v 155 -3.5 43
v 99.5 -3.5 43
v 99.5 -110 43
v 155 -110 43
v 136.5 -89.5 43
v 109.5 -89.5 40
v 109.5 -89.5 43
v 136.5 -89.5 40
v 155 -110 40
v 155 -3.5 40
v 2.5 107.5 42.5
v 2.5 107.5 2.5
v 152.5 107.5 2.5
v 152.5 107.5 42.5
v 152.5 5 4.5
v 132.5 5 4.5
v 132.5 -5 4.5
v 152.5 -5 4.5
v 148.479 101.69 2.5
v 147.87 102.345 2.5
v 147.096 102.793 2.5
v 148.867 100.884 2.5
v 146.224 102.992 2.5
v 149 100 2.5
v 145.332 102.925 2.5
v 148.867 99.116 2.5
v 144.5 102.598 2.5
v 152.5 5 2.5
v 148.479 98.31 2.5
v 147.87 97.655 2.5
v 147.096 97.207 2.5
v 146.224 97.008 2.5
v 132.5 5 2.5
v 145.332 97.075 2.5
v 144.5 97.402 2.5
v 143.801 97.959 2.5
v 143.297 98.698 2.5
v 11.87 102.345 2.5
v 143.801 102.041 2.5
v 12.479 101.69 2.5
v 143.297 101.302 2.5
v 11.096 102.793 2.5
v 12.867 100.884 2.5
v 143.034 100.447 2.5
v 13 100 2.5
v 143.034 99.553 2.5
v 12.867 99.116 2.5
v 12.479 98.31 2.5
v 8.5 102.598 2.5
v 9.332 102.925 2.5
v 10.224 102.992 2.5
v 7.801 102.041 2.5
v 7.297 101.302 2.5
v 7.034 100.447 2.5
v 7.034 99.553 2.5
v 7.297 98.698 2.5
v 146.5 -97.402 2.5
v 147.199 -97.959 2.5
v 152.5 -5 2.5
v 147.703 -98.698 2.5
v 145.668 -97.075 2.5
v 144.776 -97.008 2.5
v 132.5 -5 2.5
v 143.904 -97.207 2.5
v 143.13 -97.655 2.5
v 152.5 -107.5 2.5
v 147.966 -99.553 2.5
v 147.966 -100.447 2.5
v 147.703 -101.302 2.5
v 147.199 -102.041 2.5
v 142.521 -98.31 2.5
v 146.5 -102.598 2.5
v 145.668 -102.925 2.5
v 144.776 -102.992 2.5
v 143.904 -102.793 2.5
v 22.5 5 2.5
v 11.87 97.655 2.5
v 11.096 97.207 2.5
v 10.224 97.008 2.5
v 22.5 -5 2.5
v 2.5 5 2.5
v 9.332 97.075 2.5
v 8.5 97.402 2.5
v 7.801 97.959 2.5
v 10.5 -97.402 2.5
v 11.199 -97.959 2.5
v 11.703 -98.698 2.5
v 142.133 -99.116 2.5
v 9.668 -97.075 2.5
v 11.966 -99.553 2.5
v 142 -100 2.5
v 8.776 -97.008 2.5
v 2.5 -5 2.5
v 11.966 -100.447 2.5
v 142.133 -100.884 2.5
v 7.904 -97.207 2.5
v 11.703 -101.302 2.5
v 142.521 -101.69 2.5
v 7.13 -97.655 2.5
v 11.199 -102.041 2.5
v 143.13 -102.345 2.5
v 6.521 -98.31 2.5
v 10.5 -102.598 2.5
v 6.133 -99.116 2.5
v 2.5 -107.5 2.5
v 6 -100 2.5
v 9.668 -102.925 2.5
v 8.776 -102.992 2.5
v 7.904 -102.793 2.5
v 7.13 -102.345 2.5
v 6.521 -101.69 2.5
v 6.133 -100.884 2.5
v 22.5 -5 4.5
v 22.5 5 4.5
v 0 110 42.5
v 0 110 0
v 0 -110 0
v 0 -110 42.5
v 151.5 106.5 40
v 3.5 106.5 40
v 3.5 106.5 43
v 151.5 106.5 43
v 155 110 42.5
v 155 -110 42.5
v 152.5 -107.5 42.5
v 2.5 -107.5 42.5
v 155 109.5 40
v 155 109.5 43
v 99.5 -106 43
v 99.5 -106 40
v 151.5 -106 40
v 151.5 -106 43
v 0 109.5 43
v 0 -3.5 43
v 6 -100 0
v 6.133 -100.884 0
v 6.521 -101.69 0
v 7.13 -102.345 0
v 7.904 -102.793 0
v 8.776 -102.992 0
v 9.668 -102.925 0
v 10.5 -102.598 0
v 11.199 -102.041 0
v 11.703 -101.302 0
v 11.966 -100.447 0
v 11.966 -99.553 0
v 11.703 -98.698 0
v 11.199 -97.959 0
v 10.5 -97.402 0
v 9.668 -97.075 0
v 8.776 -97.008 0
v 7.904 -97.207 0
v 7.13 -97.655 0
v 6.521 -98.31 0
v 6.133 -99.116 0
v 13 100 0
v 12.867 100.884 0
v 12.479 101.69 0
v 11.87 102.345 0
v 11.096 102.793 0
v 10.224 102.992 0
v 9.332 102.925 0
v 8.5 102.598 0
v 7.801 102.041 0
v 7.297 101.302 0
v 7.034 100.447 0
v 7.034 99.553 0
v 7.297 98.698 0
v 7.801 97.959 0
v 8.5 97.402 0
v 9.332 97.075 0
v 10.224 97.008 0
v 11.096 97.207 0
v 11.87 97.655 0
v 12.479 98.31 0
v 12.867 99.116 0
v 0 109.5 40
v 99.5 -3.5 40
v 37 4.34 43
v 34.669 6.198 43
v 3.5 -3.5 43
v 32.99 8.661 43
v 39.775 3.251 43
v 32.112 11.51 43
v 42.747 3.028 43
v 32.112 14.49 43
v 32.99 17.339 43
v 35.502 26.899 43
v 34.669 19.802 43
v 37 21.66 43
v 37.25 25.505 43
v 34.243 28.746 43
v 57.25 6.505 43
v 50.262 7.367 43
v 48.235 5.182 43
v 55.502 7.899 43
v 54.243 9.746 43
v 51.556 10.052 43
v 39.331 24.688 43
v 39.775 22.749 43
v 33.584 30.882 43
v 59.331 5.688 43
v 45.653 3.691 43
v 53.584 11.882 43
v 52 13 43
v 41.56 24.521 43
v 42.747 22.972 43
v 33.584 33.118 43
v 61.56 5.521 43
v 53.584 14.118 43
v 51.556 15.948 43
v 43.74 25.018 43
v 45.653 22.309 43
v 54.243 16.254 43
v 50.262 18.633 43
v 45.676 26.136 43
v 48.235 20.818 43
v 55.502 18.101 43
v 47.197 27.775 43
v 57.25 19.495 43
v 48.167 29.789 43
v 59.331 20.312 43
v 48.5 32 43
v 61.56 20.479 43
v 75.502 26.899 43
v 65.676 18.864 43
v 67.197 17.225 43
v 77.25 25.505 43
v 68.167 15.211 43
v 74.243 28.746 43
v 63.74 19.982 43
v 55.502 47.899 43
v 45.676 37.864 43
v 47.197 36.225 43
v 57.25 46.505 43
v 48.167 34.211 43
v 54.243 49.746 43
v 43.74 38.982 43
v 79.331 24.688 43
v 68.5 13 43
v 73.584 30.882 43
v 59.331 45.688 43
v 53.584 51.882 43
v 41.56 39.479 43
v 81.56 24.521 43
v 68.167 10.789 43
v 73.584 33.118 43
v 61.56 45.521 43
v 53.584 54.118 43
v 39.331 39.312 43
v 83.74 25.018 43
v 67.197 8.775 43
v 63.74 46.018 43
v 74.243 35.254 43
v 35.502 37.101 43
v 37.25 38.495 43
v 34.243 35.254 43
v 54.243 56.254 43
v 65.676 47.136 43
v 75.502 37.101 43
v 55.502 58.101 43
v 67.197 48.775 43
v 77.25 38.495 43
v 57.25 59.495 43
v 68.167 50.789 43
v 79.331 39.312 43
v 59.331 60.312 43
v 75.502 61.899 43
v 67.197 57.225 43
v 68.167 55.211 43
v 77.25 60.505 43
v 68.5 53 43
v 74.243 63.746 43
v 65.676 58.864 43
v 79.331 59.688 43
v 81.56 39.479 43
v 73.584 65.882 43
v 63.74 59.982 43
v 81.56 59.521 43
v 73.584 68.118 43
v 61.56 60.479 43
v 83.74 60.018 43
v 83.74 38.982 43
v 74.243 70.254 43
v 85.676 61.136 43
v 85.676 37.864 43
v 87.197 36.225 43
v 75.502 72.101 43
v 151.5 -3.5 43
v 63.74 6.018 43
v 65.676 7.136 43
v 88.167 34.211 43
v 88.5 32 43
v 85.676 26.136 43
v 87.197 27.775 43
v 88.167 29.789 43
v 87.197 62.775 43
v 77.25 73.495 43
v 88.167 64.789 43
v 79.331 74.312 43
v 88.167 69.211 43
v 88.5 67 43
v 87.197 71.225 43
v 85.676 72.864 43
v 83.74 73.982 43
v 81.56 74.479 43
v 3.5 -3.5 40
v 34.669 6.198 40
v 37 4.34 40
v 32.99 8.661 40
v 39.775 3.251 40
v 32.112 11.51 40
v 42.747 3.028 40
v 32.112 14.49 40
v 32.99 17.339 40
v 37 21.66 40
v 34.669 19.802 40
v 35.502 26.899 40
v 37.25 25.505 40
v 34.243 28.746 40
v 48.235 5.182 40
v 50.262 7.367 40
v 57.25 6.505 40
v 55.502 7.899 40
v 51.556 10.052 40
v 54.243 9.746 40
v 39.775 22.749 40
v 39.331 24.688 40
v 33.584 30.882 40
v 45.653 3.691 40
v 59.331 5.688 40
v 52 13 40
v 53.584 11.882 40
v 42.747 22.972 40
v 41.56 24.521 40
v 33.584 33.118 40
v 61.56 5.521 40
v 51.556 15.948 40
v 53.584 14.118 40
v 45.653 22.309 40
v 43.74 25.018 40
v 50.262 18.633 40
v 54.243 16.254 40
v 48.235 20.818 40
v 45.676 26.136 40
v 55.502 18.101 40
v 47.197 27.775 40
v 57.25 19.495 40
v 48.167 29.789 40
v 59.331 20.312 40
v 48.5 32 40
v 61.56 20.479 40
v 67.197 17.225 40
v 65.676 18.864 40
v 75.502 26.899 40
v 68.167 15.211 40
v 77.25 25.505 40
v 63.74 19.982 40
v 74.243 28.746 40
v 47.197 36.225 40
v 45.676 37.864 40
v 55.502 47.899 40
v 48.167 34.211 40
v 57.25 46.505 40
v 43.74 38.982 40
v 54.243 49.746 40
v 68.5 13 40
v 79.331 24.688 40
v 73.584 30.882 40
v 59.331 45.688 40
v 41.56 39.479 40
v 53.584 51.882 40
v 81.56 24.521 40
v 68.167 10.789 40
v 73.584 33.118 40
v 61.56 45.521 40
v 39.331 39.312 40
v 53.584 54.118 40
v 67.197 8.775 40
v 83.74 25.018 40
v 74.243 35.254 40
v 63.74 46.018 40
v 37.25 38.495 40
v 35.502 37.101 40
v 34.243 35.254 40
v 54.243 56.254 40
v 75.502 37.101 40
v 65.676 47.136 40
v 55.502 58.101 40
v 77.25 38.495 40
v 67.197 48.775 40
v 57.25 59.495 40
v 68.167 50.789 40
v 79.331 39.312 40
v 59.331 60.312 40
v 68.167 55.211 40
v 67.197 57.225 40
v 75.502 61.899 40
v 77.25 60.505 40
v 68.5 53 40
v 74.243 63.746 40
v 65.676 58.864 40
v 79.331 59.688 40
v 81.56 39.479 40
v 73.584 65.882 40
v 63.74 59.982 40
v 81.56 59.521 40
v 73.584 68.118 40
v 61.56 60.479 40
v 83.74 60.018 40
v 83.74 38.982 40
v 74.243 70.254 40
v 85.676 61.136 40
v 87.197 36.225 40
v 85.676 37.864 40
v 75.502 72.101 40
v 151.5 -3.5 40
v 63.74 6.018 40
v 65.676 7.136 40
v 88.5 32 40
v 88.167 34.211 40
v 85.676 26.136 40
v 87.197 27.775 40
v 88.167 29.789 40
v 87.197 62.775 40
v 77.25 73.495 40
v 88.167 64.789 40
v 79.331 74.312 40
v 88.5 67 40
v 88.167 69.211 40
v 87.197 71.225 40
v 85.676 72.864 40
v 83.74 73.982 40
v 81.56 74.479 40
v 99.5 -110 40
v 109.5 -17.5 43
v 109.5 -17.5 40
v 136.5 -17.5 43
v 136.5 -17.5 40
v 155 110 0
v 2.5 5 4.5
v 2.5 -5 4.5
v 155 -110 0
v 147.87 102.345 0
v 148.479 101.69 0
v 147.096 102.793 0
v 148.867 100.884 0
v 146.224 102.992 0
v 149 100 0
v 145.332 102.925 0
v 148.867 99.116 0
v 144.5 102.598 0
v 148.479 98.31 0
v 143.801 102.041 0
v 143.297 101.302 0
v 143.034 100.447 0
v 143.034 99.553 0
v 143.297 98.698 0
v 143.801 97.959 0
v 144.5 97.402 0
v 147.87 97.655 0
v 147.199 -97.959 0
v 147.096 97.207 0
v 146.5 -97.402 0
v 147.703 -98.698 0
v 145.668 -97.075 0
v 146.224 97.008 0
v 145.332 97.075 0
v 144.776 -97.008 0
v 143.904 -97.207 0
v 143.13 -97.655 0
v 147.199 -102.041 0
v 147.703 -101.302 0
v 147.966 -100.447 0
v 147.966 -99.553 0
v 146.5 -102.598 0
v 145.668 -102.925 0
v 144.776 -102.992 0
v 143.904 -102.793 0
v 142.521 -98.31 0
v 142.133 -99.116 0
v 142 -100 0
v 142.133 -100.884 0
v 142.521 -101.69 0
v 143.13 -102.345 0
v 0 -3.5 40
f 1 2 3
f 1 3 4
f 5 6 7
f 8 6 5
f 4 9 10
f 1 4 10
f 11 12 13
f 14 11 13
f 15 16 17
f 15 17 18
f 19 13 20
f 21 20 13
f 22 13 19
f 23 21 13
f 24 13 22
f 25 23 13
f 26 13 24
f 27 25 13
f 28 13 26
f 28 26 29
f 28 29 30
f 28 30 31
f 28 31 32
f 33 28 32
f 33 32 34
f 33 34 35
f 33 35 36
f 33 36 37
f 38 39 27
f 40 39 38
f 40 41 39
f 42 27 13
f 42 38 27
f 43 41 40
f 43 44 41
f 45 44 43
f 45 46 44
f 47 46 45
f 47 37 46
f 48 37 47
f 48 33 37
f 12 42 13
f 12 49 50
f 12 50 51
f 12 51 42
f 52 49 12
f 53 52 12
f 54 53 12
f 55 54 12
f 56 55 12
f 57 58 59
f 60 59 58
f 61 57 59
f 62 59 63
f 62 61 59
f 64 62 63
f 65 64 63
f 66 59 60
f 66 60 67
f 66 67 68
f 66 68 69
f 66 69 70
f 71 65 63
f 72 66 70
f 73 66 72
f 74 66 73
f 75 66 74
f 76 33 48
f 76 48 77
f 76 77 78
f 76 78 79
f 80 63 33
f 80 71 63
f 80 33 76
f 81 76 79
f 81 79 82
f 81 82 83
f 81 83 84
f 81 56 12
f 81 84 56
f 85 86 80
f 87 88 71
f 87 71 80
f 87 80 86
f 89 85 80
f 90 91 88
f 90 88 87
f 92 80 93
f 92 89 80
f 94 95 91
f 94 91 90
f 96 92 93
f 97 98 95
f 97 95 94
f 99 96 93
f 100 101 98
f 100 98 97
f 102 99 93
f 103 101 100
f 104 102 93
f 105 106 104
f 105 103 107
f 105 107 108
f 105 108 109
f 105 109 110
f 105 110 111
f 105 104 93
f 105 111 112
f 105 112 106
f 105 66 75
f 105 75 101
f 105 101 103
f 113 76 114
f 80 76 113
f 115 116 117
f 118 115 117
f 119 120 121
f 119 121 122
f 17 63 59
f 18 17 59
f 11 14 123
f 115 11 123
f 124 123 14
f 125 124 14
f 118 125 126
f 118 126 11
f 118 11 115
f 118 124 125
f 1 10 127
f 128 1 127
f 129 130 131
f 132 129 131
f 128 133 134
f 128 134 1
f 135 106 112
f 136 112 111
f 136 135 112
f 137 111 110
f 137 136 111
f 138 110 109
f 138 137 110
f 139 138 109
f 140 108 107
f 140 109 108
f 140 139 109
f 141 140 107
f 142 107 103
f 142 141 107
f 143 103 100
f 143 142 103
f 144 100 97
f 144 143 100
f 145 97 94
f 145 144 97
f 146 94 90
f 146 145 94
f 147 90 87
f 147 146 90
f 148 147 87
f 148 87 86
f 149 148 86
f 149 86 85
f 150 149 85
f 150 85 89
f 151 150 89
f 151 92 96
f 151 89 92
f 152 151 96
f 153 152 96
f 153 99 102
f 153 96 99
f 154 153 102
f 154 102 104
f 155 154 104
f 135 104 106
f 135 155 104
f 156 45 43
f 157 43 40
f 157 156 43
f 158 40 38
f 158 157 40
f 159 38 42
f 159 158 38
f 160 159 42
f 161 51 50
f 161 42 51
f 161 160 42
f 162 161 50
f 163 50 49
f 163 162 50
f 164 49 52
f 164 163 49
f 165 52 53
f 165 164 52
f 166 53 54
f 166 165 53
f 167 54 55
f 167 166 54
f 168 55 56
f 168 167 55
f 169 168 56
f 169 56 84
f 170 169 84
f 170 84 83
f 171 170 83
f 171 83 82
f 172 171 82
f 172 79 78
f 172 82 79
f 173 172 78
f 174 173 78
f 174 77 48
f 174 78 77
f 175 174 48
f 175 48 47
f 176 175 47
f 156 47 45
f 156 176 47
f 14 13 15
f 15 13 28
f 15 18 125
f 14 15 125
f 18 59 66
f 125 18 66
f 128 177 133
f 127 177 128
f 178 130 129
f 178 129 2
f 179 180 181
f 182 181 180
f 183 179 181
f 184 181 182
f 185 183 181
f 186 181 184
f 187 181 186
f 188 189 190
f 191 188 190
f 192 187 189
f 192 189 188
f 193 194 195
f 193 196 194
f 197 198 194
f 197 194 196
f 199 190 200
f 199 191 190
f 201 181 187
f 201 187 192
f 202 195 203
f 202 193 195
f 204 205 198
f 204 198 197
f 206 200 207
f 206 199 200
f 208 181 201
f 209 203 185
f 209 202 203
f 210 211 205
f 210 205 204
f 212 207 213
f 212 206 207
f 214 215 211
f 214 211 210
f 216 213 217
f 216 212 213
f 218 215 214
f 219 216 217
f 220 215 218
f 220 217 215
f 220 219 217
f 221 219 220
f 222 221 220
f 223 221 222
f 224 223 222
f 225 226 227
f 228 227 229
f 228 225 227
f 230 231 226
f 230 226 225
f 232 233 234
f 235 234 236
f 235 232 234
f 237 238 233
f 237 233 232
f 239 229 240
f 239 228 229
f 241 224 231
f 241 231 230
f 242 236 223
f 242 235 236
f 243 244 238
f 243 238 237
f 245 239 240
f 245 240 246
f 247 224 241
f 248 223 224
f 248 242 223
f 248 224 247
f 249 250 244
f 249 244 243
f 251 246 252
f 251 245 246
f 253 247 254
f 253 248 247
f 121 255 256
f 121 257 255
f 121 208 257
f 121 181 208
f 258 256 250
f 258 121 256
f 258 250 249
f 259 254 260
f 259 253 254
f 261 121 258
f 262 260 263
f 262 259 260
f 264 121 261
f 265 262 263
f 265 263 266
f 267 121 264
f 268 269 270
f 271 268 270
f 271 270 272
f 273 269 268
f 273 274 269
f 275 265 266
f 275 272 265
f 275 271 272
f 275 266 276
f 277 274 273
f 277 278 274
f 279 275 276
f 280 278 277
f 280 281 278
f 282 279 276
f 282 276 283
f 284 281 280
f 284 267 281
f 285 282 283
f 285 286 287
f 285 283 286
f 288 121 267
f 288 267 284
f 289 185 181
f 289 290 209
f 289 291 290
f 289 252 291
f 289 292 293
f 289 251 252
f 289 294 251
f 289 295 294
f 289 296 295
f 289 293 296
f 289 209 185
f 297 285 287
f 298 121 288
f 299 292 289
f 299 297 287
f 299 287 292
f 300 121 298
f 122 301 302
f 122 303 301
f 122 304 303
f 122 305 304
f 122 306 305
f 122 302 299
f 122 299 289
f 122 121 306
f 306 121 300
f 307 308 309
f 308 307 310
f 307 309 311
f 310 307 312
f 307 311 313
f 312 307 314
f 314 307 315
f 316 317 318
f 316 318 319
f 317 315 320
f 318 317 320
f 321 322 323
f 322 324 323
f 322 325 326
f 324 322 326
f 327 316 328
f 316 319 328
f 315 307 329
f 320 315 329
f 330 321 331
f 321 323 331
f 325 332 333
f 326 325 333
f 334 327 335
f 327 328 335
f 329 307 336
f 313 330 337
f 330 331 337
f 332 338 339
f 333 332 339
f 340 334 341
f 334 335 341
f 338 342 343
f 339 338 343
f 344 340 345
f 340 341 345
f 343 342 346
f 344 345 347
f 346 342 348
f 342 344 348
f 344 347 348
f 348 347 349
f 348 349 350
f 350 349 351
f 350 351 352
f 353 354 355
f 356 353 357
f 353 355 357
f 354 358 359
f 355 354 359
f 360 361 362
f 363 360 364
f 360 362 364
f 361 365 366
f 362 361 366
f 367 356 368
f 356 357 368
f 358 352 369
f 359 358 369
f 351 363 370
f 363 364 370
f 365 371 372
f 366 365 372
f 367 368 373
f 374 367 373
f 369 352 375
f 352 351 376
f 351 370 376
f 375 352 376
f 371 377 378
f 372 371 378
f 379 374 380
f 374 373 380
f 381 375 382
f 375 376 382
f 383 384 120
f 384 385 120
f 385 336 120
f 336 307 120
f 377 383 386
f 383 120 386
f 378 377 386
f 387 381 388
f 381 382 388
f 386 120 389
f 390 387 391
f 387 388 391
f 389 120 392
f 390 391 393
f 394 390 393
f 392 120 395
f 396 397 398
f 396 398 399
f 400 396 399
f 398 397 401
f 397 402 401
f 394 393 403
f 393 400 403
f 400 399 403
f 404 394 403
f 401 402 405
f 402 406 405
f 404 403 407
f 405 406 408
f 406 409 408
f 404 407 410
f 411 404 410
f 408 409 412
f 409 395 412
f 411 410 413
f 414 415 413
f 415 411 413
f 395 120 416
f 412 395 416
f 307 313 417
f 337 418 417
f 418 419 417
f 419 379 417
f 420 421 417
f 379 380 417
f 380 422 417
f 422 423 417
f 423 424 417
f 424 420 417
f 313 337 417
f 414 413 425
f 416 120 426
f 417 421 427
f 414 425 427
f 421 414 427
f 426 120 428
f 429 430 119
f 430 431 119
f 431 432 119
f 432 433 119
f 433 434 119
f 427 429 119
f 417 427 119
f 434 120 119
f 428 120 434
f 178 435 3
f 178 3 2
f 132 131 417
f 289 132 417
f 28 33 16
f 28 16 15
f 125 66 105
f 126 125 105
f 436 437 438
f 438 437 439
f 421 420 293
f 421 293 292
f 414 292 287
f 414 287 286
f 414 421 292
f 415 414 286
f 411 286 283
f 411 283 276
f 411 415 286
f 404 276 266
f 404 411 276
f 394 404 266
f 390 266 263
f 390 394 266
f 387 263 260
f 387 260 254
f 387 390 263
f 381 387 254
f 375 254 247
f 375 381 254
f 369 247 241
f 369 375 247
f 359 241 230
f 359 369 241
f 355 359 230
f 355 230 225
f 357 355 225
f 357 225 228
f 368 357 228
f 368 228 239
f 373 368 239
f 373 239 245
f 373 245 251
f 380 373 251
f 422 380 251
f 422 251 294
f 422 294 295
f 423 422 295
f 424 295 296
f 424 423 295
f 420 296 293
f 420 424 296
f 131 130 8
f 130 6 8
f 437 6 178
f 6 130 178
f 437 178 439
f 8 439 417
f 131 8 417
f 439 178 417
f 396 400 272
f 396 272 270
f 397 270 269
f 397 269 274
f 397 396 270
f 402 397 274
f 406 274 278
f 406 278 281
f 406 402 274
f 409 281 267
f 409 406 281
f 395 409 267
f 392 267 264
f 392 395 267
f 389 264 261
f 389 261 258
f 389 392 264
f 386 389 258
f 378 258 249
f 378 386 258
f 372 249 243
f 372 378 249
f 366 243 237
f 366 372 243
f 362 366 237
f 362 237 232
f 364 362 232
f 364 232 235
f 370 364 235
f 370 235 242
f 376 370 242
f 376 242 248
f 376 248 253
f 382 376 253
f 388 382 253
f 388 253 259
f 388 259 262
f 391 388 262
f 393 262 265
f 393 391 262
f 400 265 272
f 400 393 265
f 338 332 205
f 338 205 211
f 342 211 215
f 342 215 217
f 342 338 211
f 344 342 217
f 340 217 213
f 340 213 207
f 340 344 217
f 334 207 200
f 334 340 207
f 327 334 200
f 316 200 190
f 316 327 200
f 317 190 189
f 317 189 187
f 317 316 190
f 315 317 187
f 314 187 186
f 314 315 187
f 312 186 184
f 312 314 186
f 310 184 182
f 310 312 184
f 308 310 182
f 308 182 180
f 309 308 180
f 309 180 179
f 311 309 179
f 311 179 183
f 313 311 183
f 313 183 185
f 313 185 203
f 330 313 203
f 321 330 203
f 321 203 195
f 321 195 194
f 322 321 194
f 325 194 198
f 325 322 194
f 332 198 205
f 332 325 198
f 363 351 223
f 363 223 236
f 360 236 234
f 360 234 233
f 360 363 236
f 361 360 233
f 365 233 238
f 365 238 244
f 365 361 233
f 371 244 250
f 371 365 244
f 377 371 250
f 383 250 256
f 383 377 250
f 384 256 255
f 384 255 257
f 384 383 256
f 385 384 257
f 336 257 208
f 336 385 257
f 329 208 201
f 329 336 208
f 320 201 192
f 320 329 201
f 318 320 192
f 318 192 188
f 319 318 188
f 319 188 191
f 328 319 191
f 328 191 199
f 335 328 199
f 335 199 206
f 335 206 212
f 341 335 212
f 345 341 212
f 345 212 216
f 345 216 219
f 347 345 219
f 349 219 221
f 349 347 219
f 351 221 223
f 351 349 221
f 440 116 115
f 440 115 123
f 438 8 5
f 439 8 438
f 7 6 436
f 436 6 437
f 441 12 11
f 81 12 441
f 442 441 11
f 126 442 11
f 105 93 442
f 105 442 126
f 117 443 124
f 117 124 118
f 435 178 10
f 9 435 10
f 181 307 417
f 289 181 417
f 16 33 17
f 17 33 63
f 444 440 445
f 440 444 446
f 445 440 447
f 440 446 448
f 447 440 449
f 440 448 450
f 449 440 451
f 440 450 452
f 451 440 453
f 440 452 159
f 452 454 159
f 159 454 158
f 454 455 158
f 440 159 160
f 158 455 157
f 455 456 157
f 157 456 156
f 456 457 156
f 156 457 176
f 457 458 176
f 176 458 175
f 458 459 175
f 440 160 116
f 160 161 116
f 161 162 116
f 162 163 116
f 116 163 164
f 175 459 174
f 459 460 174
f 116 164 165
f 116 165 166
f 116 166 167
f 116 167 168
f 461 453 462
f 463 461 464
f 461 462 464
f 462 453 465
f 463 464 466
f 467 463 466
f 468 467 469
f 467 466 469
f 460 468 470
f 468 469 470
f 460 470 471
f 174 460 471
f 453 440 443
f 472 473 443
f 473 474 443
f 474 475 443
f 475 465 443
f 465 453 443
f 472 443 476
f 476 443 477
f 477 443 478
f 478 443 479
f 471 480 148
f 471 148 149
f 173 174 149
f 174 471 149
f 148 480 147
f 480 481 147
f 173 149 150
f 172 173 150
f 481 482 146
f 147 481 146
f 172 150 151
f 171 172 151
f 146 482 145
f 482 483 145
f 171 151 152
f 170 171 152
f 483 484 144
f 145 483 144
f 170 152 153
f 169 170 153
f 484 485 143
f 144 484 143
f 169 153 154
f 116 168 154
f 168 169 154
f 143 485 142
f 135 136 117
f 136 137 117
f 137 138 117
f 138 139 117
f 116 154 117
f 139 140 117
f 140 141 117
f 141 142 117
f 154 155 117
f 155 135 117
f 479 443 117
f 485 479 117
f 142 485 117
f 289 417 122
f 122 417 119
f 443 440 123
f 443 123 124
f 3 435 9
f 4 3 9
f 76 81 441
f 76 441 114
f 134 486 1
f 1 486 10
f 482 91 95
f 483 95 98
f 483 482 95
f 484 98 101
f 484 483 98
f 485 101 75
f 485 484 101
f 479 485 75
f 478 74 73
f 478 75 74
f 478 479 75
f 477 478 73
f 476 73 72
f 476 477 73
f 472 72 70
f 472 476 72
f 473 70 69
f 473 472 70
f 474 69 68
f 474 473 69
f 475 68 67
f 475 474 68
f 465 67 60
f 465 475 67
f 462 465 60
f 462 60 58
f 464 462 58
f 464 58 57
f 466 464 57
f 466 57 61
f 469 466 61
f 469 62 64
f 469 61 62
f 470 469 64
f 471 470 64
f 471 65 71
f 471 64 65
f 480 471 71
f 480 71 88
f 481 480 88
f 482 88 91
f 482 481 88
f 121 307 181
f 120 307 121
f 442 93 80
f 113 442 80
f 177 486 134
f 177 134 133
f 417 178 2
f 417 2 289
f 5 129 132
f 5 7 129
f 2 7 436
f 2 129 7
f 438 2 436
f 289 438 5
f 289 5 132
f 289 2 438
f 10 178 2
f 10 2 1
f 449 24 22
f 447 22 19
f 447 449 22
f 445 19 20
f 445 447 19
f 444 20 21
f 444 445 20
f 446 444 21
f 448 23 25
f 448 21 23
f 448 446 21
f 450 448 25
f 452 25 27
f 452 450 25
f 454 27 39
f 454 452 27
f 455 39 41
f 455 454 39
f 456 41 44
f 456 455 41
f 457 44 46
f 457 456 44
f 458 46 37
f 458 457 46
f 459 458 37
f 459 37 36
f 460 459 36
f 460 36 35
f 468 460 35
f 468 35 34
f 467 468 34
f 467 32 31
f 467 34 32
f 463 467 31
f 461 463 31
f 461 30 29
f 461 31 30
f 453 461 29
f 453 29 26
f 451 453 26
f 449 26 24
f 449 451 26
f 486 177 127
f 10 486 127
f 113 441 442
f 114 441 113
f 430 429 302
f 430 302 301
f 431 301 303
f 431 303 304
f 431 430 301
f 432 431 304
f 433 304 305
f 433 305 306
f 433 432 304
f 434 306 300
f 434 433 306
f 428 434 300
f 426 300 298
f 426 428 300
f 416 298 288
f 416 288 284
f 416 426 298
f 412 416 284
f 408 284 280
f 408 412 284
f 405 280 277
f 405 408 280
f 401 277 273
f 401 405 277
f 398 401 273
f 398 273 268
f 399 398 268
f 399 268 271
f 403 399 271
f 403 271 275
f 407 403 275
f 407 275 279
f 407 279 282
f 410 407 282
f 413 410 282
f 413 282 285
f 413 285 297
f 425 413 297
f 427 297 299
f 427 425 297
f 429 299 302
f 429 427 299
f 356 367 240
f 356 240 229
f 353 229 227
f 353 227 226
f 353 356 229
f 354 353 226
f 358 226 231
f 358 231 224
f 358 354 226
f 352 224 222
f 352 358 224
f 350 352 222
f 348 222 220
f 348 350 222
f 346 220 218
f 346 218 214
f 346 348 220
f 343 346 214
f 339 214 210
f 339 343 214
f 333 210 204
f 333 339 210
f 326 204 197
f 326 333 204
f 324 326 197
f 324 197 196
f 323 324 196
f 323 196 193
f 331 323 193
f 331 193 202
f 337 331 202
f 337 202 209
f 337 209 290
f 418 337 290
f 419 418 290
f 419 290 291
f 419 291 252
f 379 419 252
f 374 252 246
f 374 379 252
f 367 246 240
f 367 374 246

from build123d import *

# Parameters (mm, degrees)
BOX_W                     = 155
BOX_H                     = 113
BOX_DEPTH                 = 3
BOX010_W                  = 55.5
BOX010_H                  = 106.5
BOX010_DEPTH              = 3
BOX015_W                  = 10
BOX015_H                  = 10
BOX015_DEPTH              = 2
CYLINDER003_R             = 3
CYLINDER003_DEPTH         = 10
CYLINDER004_R             = 3
CYLINDER004_DEPTH         = 10
BOX013_W                  = 2.5
BOX013_H                  = 110
BOX013_DEPTH              = 42.5
BOX016_W                  = 155
BOX016_H                  = 2.5
BOX016_DEPTH              = 42.5
BOX011_W                  = 155
BOX011_H                  = 110
BOX011_DEPTH              = 2.5
BOX012_W                  = 2.5
BOX012_H                  = 110
BOX012_DEPTH              = 42.5
BOX014_W                  = 10
BOX014_H                  = 10
BOX014_DEPTH              = 2
FUSION003_PLACEMENT_ANGLE = 180
CYLINDER001_R             = 3
CYLINDER001_DEPTH         = 10
CYLINDER002_R             = 3
CYLINDER002_DEPTH         = 10
BOX006_W                  = 2.5
BOX006_H                  = 110
BOX006_DEPTH              = 42.5
BOX007_W                  = 155
BOX007_H                  = 2.5
BOX007_DEPTH              = 42.5
BOX004_W                  = 155
BOX004_H                  = 110
BOX004_DEPTH              = 2.5
BOX005_W                  = 2.5
BOX005_H                  = 110
BOX005_DEPTH              = 42.5
BOX009_W                  = 10
BOX009_H                  = 10
BOX009_DEPTH              = 2
BOX008_W                  = 10
BOX008_H                  = 10
BOX008_DEPTH              = 2
BOX019_W                  = 27
BOX019_H                  = 72
BOX019_DEPTH              = 3
BOX018_W                  = 52
BOX018_H                  = 102.5
BOX018_DEPTH              = 3
CYLINDER009_R             = 10
CYLINDER009_DEPTH         = 3
CYLINDER005_R             = 7.5
CYLINDER005_DEPTH         = 3
CYLINDER006_R             = 7.5
CYLINDER006_DEPTH         = 3
CYLINDER007_R             = 7.5
CYLINDER007_DEPTH         = 3
CYLINDER008_R             = 7.5
CYLINDER008_DEPTH         = 3
CYLINDER_R                = 7.5
CYLINDER_DEPTH            = 3
BOX017_W                  = 148
BOX017_H                  = 110
BOX017_DEPTH              = 3


with BuildPart() as tampa1:
    # Box → Box (new body)
    with BuildSketch(Plane(origin=(0, -3.5, 40), x_dir=(1, 0, 0), z_dir=(0, 0, 1))):
        with Locations((77.5, 56.5)):
            Rectangle(BOX_W, BOX_H)
    extrude(amount=BOX_DEPTH)


with BuildPart() as tampa2:
    # Box010 → Box010 (new body)
    with BuildSketch(Plane(origin=(99.5, -110, 40), x_dir=(1, 0, 0), z_dir=(0, 0, 1))):
        with Locations((27.75, 53.25)):
            Rectangle(BOX010_W, BOX010_H)
    extrude(amount=BOX010_DEPTH)


with BuildPart() as suporte003:
    # Box015 → Box015 (new body)
    with BuildSketch(Plane(origin=(132.5, -5, 2.5), x_dir=(1, 0, 0), z_dir=(0, 0, 1))):
        with Locations((5, 5)):
            Rectangle(BOX015_W, BOX015_H)
    extrude(amount=BOX015_DEPTH)


with BuildPart() as cylinder003:
    # Cylinder003 → Cylinder003 (new body)
    with BuildSketch(Plane(origin=(10, 100, 0), x_dir=(1, 0, 0), z_dir=(0, 0, 1))):
        Circle(CYLINDER003_R)
    extrude(amount=CYLINDER003_DEPTH)


with BuildPart() as cylinder004:
    # Cylinder004 → Cylinder004 (new body)
    with BuildSketch(Plane(origin=(146, 100, 0), x_dir=(1, 0, 0), z_dir=(0, 0, 1))):
        Circle(CYLINDER004_R)
    extrude(amount=CYLINDER004_DEPTH)


with BuildPart() as wall_lado004:
    # Box013 → Box013 (new body)
    with BuildSketch(Plane(origin=(152.5, 0, 0), x_dir=(1, 0, 0), z_dir=(0, 0, 1))):
        with Locations((1.25, 55)):
            Rectangle(BOX013_W, BOX013_H)
    extrude(amount=BOX013_DEPTH)


with BuildPart() as wall_tras001:
    # Box016 → Box016 (new body)
    with BuildSketch(Plane(origin=(0, 107.5, 0), x_dir=(1, 0, 0), z_dir=(0, 0, 1))):
        with Locations((77.5, 1.25)):
            Rectangle(BOX016_W, BOX016_H)
    extrude(amount=BOX016_DEPTH)


with BuildPart() as base001:
    # Box011 → Box011 (new body)
    with BuildSketch(Plane.XY):
        with Locations((77.5, 55)):
            Rectangle(BOX011_W, BOX011_H)
    extrude(amount=BOX011_DEPTH)


with BuildPart() as cut003:
    # Box012 → Box012 (new body)
    with BuildSketch(Plane.XY):
        with Locations((1.25, 55)):
            Rectangle(BOX012_W, BOX012_H)
    extrude(amount=BOX012_DEPTH)

    # Fusion004: union wall_lado004, wall_tras001, base001
    add(wall_lado004.part)
    add(wall_tras001.part)
    add(base001.part)

    # Cut002: cut Cylinder004
    add(cylinder004.part, mode=Mode.SUBTRACT)

    # Cut003: cut Cylinder003
    add(cylinder003.part, mode=Mode.SUBTRACT)


with BuildPart() as partedois:
    # Box014 → Box014 (new body)
    with BuildSketch(Plane(origin=(12.5, -5, 2.5), x_dir=(1, 0, 0), z_dir=(0, 0, 1))):
        with Locations((5, 5)):
            Rectangle(BOX014_W, BOX014_H)
    extrude(amount=BOX014_DEPTH)

    # Fusion003: union suporte003, Cut003
    add(suporte003.part)
    add(cut003.part)


with BuildPart() as partedois_1:
    # Fusion003 placement: moved
    add(partedois.part.moved(Location((155, 0, 0))).rotate(Axis((155, 0, 0), (0, 0, 1)), FUSION003_PLACEMENT_ANGLE))


with BuildPart() as cylinder001:
    # Cylinder001 → Cylinder001 (new body)
    with BuildSketch(Plane(origin=(10, 100, 0), x_dir=(1, 0, 0), z_dir=(0, 0, 1))):
        Circle(CYLINDER001_R)
    extrude(amount=CYLINDER001_DEPTH)


with BuildPart() as cylinder002:
    # Cylinder002 → Cylinder002 (new body)
    with BuildSketch(Plane(origin=(146, 100, 0), x_dir=(1, 0, 0), z_dir=(0, 0, 1))):
        Circle(CYLINDER002_R)
    extrude(amount=CYLINDER002_DEPTH)


with BuildPart() as wall_lado2:
    # Box006 → Box006 (new body)
    with BuildSketch(Plane(origin=(152.5, 0, 0), x_dir=(1, 0, 0), z_dir=(0, 0, 1))):
        with Locations((1.25, 55)):
            Rectangle(BOX006_W, BOX006_H)
    extrude(amount=BOX006_DEPTH)


with BuildPart() as wall_tras:
    # Box007 → Box007 (new body)
    with BuildSketch(Plane(origin=(0, 107.5, 0), x_dir=(1, 0, 0), z_dir=(0, 0, 1))):
        with Locations((77.5, 1.25)):
            Rectangle(BOX007_W, BOX007_H)
    extrude(amount=BOX007_DEPTH)


with BuildPart() as base:
    # Box004 → Box004 (new body)
    with BuildSketch(Plane.XY):
        with Locations((77.5, 55)):
            Rectangle(BOX004_W, BOX004_H)
    extrude(amount=BOX004_DEPTH)


with BuildPart() as cut001:
    # Box005 → Box005 (new body)
    with BuildSketch(Plane.XY):
        with Locations((1.25, 55)):
            Rectangle(BOX005_W, BOX005_H)
    extrude(amount=BOX005_DEPTH)

    # Fusion001: union wall_lado2, wall_tras, base
    add(wall_lado2.part)
    add(wall_tras.part)
    add(base.part)

    # Cut: cut Cylinder002
    add(cylinder002.part, mode=Mode.SUBTRACT)

    # Cut001: cut Cylinder001
    add(cylinder001.part, mode=Mode.SUBTRACT)


with BuildPart() as fusion:
    # Box009 → Box009 (new body)
    with BuildSketch(Plane(origin=(142.5, -5, 2.5), x_dir=(1, 0, 0), z_dir=(0, 0, 1))):
        with Locations((5, 5)):
            Rectangle(BOX009_W, BOX009_H)
    extrude(amount=BOX009_DEPTH)

    # Fusion: union Cut001
    add(cut001.part)


with BuildPart() as caixa:
    # Box008 → Box008 (new body)
    with BuildSketch(Plane(origin=(2.5, -5, 2.5), x_dir=(1, 0, 0), z_dir=(0, 0, 1))):
        with Locations((5, 5)):
            Rectangle(BOX008_W, BOX008_H)
    extrude(amount=BOX008_DEPTH)

    # Fusion002: union Fusion
    add(fusion.part)

    # Fusion005: union partedois
    add(partedois_1.part)


with BuildPart() as buraco:
    # Box019 → Box019 (new body)
    with BuildSketch(Plane(origin=(109.5, -89.5, 40), x_dir=(1, 0, 0), z_dir=(0, 0, 1))):
        with Locations((13.5, 36)):
            Rectangle(BOX019_W, BOX019_H)
    extrude(amount=BOX019_DEPTH)


with BuildPart() as moldura_lcd:
    # Box018 → Box018 (new body)
    with BuildSketch(Plane(origin=(99.5, -106, 40), x_dir=(1, 0, 0), z_dir=(0, 0, 1))):
        with Locations((26, 51.25)):
            Rectangle(BOX018_W, BOX018_H)
    extrude(amount=BOX018_DEPTH)

    # Cut004: cut buraco
    add(buraco.part, mode=Mode.SUBTRACT)


with BuildPart() as buzzer:
    # Cylinder009 → Cylinder009 (new body)
    with BuildSketch(Plane(origin=(42, 13, 40), x_dir=(1, 0, 0), z_dir=(0, 0, 1))):
        Circle(CYLINDER009_R)
    extrude(amount=CYLINDER009_DEPTH)


with BuildPart() as botao2:
    # Cylinder005 → Cylinder005 (new body)
    with BuildSketch(Plane(origin=(61, 13, 40), x_dir=(1, 0, 0), z_dir=(0, 0, 1))):
        Circle(CYLINDER005_R)
    extrude(amount=CYLINDER005_DEPTH)


with BuildPart() as botao3:
    # Cylinder006 → Cylinder006 (new body)
    with BuildSketch(Plane(origin=(61, 53, 40), x_dir=(1, 0, 0), z_dir=(0, 0, 1))):
        Circle(CYLINDER006_R)
    extrude(amount=CYLINDER006_DEPTH)


with BuildPart() as botao4:
    # Cylinder007 → Cylinder007 (new body)
    with BuildSketch(Plane(origin=(81, 32, 40), x_dir=(1, 0, 0), z_dir=(0, 0, 1))):
        Circle(CYLINDER007_R)
    extrude(amount=CYLINDER007_DEPTH)


with BuildPart() as botao5:
    # Cylinder008 → Cylinder008 (new body)
    with BuildSketch(Plane(origin=(81, 67, 40), x_dir=(1, 0, 0), z_dir=(0, 0, 1))):
        Circle(CYLINDER008_R)
    extrude(amount=CYLINDER008_DEPTH)


with BuildPart() as botao1:
    # Cylinder → Cylinder (new body)
    with BuildSketch(Plane(origin=(41, 32, 40), x_dir=(1, 0, 0), z_dir=(0, 0, 1))):
        Circle(CYLINDER_R)
    extrude(amount=CYLINDER_DEPTH)


with BuildPart() as moldura_teclado:
    # Box017 → Box017 (new body)
    with BuildSketch(Plane(origin=(3.5, -3.5, 40), x_dir=(1, 0, 0), z_dir=(0, 0, 1))):
        with Locations((74, 55)):
            Rectangle(BOX017_W, BOX017_H)
    extrude(amount=BOX017_DEPTH)

    # Cut005: cut botao1
    add(botao1.part, mode=Mode.SUBTRACT)

    # Cut006: cut botao5
    add(botao5.part, mode=Mode.SUBTRACT)

    # Cut007: cut botao5
    add(botao5.part, mode=Mode.SUBTRACT)

    # Cut008: cut botao4
    add(botao4.part, mode=Mode.SUBTRACT)

    # Cut009: cut botao3
    add(botao3.part, mode=Mode.SUBTRACT)

    # Cut010: cut botao2
    add(botao2.part, mode=Mode.SUBTRACT)

    # Cut011: cut buzzer
    add(buzzer.part, mode=Mode.SUBTRACT)


solid = Compound([tampa1.part, tampa2.part, caixa.part, moldura_lcd.part, moldura_teclado.part])
